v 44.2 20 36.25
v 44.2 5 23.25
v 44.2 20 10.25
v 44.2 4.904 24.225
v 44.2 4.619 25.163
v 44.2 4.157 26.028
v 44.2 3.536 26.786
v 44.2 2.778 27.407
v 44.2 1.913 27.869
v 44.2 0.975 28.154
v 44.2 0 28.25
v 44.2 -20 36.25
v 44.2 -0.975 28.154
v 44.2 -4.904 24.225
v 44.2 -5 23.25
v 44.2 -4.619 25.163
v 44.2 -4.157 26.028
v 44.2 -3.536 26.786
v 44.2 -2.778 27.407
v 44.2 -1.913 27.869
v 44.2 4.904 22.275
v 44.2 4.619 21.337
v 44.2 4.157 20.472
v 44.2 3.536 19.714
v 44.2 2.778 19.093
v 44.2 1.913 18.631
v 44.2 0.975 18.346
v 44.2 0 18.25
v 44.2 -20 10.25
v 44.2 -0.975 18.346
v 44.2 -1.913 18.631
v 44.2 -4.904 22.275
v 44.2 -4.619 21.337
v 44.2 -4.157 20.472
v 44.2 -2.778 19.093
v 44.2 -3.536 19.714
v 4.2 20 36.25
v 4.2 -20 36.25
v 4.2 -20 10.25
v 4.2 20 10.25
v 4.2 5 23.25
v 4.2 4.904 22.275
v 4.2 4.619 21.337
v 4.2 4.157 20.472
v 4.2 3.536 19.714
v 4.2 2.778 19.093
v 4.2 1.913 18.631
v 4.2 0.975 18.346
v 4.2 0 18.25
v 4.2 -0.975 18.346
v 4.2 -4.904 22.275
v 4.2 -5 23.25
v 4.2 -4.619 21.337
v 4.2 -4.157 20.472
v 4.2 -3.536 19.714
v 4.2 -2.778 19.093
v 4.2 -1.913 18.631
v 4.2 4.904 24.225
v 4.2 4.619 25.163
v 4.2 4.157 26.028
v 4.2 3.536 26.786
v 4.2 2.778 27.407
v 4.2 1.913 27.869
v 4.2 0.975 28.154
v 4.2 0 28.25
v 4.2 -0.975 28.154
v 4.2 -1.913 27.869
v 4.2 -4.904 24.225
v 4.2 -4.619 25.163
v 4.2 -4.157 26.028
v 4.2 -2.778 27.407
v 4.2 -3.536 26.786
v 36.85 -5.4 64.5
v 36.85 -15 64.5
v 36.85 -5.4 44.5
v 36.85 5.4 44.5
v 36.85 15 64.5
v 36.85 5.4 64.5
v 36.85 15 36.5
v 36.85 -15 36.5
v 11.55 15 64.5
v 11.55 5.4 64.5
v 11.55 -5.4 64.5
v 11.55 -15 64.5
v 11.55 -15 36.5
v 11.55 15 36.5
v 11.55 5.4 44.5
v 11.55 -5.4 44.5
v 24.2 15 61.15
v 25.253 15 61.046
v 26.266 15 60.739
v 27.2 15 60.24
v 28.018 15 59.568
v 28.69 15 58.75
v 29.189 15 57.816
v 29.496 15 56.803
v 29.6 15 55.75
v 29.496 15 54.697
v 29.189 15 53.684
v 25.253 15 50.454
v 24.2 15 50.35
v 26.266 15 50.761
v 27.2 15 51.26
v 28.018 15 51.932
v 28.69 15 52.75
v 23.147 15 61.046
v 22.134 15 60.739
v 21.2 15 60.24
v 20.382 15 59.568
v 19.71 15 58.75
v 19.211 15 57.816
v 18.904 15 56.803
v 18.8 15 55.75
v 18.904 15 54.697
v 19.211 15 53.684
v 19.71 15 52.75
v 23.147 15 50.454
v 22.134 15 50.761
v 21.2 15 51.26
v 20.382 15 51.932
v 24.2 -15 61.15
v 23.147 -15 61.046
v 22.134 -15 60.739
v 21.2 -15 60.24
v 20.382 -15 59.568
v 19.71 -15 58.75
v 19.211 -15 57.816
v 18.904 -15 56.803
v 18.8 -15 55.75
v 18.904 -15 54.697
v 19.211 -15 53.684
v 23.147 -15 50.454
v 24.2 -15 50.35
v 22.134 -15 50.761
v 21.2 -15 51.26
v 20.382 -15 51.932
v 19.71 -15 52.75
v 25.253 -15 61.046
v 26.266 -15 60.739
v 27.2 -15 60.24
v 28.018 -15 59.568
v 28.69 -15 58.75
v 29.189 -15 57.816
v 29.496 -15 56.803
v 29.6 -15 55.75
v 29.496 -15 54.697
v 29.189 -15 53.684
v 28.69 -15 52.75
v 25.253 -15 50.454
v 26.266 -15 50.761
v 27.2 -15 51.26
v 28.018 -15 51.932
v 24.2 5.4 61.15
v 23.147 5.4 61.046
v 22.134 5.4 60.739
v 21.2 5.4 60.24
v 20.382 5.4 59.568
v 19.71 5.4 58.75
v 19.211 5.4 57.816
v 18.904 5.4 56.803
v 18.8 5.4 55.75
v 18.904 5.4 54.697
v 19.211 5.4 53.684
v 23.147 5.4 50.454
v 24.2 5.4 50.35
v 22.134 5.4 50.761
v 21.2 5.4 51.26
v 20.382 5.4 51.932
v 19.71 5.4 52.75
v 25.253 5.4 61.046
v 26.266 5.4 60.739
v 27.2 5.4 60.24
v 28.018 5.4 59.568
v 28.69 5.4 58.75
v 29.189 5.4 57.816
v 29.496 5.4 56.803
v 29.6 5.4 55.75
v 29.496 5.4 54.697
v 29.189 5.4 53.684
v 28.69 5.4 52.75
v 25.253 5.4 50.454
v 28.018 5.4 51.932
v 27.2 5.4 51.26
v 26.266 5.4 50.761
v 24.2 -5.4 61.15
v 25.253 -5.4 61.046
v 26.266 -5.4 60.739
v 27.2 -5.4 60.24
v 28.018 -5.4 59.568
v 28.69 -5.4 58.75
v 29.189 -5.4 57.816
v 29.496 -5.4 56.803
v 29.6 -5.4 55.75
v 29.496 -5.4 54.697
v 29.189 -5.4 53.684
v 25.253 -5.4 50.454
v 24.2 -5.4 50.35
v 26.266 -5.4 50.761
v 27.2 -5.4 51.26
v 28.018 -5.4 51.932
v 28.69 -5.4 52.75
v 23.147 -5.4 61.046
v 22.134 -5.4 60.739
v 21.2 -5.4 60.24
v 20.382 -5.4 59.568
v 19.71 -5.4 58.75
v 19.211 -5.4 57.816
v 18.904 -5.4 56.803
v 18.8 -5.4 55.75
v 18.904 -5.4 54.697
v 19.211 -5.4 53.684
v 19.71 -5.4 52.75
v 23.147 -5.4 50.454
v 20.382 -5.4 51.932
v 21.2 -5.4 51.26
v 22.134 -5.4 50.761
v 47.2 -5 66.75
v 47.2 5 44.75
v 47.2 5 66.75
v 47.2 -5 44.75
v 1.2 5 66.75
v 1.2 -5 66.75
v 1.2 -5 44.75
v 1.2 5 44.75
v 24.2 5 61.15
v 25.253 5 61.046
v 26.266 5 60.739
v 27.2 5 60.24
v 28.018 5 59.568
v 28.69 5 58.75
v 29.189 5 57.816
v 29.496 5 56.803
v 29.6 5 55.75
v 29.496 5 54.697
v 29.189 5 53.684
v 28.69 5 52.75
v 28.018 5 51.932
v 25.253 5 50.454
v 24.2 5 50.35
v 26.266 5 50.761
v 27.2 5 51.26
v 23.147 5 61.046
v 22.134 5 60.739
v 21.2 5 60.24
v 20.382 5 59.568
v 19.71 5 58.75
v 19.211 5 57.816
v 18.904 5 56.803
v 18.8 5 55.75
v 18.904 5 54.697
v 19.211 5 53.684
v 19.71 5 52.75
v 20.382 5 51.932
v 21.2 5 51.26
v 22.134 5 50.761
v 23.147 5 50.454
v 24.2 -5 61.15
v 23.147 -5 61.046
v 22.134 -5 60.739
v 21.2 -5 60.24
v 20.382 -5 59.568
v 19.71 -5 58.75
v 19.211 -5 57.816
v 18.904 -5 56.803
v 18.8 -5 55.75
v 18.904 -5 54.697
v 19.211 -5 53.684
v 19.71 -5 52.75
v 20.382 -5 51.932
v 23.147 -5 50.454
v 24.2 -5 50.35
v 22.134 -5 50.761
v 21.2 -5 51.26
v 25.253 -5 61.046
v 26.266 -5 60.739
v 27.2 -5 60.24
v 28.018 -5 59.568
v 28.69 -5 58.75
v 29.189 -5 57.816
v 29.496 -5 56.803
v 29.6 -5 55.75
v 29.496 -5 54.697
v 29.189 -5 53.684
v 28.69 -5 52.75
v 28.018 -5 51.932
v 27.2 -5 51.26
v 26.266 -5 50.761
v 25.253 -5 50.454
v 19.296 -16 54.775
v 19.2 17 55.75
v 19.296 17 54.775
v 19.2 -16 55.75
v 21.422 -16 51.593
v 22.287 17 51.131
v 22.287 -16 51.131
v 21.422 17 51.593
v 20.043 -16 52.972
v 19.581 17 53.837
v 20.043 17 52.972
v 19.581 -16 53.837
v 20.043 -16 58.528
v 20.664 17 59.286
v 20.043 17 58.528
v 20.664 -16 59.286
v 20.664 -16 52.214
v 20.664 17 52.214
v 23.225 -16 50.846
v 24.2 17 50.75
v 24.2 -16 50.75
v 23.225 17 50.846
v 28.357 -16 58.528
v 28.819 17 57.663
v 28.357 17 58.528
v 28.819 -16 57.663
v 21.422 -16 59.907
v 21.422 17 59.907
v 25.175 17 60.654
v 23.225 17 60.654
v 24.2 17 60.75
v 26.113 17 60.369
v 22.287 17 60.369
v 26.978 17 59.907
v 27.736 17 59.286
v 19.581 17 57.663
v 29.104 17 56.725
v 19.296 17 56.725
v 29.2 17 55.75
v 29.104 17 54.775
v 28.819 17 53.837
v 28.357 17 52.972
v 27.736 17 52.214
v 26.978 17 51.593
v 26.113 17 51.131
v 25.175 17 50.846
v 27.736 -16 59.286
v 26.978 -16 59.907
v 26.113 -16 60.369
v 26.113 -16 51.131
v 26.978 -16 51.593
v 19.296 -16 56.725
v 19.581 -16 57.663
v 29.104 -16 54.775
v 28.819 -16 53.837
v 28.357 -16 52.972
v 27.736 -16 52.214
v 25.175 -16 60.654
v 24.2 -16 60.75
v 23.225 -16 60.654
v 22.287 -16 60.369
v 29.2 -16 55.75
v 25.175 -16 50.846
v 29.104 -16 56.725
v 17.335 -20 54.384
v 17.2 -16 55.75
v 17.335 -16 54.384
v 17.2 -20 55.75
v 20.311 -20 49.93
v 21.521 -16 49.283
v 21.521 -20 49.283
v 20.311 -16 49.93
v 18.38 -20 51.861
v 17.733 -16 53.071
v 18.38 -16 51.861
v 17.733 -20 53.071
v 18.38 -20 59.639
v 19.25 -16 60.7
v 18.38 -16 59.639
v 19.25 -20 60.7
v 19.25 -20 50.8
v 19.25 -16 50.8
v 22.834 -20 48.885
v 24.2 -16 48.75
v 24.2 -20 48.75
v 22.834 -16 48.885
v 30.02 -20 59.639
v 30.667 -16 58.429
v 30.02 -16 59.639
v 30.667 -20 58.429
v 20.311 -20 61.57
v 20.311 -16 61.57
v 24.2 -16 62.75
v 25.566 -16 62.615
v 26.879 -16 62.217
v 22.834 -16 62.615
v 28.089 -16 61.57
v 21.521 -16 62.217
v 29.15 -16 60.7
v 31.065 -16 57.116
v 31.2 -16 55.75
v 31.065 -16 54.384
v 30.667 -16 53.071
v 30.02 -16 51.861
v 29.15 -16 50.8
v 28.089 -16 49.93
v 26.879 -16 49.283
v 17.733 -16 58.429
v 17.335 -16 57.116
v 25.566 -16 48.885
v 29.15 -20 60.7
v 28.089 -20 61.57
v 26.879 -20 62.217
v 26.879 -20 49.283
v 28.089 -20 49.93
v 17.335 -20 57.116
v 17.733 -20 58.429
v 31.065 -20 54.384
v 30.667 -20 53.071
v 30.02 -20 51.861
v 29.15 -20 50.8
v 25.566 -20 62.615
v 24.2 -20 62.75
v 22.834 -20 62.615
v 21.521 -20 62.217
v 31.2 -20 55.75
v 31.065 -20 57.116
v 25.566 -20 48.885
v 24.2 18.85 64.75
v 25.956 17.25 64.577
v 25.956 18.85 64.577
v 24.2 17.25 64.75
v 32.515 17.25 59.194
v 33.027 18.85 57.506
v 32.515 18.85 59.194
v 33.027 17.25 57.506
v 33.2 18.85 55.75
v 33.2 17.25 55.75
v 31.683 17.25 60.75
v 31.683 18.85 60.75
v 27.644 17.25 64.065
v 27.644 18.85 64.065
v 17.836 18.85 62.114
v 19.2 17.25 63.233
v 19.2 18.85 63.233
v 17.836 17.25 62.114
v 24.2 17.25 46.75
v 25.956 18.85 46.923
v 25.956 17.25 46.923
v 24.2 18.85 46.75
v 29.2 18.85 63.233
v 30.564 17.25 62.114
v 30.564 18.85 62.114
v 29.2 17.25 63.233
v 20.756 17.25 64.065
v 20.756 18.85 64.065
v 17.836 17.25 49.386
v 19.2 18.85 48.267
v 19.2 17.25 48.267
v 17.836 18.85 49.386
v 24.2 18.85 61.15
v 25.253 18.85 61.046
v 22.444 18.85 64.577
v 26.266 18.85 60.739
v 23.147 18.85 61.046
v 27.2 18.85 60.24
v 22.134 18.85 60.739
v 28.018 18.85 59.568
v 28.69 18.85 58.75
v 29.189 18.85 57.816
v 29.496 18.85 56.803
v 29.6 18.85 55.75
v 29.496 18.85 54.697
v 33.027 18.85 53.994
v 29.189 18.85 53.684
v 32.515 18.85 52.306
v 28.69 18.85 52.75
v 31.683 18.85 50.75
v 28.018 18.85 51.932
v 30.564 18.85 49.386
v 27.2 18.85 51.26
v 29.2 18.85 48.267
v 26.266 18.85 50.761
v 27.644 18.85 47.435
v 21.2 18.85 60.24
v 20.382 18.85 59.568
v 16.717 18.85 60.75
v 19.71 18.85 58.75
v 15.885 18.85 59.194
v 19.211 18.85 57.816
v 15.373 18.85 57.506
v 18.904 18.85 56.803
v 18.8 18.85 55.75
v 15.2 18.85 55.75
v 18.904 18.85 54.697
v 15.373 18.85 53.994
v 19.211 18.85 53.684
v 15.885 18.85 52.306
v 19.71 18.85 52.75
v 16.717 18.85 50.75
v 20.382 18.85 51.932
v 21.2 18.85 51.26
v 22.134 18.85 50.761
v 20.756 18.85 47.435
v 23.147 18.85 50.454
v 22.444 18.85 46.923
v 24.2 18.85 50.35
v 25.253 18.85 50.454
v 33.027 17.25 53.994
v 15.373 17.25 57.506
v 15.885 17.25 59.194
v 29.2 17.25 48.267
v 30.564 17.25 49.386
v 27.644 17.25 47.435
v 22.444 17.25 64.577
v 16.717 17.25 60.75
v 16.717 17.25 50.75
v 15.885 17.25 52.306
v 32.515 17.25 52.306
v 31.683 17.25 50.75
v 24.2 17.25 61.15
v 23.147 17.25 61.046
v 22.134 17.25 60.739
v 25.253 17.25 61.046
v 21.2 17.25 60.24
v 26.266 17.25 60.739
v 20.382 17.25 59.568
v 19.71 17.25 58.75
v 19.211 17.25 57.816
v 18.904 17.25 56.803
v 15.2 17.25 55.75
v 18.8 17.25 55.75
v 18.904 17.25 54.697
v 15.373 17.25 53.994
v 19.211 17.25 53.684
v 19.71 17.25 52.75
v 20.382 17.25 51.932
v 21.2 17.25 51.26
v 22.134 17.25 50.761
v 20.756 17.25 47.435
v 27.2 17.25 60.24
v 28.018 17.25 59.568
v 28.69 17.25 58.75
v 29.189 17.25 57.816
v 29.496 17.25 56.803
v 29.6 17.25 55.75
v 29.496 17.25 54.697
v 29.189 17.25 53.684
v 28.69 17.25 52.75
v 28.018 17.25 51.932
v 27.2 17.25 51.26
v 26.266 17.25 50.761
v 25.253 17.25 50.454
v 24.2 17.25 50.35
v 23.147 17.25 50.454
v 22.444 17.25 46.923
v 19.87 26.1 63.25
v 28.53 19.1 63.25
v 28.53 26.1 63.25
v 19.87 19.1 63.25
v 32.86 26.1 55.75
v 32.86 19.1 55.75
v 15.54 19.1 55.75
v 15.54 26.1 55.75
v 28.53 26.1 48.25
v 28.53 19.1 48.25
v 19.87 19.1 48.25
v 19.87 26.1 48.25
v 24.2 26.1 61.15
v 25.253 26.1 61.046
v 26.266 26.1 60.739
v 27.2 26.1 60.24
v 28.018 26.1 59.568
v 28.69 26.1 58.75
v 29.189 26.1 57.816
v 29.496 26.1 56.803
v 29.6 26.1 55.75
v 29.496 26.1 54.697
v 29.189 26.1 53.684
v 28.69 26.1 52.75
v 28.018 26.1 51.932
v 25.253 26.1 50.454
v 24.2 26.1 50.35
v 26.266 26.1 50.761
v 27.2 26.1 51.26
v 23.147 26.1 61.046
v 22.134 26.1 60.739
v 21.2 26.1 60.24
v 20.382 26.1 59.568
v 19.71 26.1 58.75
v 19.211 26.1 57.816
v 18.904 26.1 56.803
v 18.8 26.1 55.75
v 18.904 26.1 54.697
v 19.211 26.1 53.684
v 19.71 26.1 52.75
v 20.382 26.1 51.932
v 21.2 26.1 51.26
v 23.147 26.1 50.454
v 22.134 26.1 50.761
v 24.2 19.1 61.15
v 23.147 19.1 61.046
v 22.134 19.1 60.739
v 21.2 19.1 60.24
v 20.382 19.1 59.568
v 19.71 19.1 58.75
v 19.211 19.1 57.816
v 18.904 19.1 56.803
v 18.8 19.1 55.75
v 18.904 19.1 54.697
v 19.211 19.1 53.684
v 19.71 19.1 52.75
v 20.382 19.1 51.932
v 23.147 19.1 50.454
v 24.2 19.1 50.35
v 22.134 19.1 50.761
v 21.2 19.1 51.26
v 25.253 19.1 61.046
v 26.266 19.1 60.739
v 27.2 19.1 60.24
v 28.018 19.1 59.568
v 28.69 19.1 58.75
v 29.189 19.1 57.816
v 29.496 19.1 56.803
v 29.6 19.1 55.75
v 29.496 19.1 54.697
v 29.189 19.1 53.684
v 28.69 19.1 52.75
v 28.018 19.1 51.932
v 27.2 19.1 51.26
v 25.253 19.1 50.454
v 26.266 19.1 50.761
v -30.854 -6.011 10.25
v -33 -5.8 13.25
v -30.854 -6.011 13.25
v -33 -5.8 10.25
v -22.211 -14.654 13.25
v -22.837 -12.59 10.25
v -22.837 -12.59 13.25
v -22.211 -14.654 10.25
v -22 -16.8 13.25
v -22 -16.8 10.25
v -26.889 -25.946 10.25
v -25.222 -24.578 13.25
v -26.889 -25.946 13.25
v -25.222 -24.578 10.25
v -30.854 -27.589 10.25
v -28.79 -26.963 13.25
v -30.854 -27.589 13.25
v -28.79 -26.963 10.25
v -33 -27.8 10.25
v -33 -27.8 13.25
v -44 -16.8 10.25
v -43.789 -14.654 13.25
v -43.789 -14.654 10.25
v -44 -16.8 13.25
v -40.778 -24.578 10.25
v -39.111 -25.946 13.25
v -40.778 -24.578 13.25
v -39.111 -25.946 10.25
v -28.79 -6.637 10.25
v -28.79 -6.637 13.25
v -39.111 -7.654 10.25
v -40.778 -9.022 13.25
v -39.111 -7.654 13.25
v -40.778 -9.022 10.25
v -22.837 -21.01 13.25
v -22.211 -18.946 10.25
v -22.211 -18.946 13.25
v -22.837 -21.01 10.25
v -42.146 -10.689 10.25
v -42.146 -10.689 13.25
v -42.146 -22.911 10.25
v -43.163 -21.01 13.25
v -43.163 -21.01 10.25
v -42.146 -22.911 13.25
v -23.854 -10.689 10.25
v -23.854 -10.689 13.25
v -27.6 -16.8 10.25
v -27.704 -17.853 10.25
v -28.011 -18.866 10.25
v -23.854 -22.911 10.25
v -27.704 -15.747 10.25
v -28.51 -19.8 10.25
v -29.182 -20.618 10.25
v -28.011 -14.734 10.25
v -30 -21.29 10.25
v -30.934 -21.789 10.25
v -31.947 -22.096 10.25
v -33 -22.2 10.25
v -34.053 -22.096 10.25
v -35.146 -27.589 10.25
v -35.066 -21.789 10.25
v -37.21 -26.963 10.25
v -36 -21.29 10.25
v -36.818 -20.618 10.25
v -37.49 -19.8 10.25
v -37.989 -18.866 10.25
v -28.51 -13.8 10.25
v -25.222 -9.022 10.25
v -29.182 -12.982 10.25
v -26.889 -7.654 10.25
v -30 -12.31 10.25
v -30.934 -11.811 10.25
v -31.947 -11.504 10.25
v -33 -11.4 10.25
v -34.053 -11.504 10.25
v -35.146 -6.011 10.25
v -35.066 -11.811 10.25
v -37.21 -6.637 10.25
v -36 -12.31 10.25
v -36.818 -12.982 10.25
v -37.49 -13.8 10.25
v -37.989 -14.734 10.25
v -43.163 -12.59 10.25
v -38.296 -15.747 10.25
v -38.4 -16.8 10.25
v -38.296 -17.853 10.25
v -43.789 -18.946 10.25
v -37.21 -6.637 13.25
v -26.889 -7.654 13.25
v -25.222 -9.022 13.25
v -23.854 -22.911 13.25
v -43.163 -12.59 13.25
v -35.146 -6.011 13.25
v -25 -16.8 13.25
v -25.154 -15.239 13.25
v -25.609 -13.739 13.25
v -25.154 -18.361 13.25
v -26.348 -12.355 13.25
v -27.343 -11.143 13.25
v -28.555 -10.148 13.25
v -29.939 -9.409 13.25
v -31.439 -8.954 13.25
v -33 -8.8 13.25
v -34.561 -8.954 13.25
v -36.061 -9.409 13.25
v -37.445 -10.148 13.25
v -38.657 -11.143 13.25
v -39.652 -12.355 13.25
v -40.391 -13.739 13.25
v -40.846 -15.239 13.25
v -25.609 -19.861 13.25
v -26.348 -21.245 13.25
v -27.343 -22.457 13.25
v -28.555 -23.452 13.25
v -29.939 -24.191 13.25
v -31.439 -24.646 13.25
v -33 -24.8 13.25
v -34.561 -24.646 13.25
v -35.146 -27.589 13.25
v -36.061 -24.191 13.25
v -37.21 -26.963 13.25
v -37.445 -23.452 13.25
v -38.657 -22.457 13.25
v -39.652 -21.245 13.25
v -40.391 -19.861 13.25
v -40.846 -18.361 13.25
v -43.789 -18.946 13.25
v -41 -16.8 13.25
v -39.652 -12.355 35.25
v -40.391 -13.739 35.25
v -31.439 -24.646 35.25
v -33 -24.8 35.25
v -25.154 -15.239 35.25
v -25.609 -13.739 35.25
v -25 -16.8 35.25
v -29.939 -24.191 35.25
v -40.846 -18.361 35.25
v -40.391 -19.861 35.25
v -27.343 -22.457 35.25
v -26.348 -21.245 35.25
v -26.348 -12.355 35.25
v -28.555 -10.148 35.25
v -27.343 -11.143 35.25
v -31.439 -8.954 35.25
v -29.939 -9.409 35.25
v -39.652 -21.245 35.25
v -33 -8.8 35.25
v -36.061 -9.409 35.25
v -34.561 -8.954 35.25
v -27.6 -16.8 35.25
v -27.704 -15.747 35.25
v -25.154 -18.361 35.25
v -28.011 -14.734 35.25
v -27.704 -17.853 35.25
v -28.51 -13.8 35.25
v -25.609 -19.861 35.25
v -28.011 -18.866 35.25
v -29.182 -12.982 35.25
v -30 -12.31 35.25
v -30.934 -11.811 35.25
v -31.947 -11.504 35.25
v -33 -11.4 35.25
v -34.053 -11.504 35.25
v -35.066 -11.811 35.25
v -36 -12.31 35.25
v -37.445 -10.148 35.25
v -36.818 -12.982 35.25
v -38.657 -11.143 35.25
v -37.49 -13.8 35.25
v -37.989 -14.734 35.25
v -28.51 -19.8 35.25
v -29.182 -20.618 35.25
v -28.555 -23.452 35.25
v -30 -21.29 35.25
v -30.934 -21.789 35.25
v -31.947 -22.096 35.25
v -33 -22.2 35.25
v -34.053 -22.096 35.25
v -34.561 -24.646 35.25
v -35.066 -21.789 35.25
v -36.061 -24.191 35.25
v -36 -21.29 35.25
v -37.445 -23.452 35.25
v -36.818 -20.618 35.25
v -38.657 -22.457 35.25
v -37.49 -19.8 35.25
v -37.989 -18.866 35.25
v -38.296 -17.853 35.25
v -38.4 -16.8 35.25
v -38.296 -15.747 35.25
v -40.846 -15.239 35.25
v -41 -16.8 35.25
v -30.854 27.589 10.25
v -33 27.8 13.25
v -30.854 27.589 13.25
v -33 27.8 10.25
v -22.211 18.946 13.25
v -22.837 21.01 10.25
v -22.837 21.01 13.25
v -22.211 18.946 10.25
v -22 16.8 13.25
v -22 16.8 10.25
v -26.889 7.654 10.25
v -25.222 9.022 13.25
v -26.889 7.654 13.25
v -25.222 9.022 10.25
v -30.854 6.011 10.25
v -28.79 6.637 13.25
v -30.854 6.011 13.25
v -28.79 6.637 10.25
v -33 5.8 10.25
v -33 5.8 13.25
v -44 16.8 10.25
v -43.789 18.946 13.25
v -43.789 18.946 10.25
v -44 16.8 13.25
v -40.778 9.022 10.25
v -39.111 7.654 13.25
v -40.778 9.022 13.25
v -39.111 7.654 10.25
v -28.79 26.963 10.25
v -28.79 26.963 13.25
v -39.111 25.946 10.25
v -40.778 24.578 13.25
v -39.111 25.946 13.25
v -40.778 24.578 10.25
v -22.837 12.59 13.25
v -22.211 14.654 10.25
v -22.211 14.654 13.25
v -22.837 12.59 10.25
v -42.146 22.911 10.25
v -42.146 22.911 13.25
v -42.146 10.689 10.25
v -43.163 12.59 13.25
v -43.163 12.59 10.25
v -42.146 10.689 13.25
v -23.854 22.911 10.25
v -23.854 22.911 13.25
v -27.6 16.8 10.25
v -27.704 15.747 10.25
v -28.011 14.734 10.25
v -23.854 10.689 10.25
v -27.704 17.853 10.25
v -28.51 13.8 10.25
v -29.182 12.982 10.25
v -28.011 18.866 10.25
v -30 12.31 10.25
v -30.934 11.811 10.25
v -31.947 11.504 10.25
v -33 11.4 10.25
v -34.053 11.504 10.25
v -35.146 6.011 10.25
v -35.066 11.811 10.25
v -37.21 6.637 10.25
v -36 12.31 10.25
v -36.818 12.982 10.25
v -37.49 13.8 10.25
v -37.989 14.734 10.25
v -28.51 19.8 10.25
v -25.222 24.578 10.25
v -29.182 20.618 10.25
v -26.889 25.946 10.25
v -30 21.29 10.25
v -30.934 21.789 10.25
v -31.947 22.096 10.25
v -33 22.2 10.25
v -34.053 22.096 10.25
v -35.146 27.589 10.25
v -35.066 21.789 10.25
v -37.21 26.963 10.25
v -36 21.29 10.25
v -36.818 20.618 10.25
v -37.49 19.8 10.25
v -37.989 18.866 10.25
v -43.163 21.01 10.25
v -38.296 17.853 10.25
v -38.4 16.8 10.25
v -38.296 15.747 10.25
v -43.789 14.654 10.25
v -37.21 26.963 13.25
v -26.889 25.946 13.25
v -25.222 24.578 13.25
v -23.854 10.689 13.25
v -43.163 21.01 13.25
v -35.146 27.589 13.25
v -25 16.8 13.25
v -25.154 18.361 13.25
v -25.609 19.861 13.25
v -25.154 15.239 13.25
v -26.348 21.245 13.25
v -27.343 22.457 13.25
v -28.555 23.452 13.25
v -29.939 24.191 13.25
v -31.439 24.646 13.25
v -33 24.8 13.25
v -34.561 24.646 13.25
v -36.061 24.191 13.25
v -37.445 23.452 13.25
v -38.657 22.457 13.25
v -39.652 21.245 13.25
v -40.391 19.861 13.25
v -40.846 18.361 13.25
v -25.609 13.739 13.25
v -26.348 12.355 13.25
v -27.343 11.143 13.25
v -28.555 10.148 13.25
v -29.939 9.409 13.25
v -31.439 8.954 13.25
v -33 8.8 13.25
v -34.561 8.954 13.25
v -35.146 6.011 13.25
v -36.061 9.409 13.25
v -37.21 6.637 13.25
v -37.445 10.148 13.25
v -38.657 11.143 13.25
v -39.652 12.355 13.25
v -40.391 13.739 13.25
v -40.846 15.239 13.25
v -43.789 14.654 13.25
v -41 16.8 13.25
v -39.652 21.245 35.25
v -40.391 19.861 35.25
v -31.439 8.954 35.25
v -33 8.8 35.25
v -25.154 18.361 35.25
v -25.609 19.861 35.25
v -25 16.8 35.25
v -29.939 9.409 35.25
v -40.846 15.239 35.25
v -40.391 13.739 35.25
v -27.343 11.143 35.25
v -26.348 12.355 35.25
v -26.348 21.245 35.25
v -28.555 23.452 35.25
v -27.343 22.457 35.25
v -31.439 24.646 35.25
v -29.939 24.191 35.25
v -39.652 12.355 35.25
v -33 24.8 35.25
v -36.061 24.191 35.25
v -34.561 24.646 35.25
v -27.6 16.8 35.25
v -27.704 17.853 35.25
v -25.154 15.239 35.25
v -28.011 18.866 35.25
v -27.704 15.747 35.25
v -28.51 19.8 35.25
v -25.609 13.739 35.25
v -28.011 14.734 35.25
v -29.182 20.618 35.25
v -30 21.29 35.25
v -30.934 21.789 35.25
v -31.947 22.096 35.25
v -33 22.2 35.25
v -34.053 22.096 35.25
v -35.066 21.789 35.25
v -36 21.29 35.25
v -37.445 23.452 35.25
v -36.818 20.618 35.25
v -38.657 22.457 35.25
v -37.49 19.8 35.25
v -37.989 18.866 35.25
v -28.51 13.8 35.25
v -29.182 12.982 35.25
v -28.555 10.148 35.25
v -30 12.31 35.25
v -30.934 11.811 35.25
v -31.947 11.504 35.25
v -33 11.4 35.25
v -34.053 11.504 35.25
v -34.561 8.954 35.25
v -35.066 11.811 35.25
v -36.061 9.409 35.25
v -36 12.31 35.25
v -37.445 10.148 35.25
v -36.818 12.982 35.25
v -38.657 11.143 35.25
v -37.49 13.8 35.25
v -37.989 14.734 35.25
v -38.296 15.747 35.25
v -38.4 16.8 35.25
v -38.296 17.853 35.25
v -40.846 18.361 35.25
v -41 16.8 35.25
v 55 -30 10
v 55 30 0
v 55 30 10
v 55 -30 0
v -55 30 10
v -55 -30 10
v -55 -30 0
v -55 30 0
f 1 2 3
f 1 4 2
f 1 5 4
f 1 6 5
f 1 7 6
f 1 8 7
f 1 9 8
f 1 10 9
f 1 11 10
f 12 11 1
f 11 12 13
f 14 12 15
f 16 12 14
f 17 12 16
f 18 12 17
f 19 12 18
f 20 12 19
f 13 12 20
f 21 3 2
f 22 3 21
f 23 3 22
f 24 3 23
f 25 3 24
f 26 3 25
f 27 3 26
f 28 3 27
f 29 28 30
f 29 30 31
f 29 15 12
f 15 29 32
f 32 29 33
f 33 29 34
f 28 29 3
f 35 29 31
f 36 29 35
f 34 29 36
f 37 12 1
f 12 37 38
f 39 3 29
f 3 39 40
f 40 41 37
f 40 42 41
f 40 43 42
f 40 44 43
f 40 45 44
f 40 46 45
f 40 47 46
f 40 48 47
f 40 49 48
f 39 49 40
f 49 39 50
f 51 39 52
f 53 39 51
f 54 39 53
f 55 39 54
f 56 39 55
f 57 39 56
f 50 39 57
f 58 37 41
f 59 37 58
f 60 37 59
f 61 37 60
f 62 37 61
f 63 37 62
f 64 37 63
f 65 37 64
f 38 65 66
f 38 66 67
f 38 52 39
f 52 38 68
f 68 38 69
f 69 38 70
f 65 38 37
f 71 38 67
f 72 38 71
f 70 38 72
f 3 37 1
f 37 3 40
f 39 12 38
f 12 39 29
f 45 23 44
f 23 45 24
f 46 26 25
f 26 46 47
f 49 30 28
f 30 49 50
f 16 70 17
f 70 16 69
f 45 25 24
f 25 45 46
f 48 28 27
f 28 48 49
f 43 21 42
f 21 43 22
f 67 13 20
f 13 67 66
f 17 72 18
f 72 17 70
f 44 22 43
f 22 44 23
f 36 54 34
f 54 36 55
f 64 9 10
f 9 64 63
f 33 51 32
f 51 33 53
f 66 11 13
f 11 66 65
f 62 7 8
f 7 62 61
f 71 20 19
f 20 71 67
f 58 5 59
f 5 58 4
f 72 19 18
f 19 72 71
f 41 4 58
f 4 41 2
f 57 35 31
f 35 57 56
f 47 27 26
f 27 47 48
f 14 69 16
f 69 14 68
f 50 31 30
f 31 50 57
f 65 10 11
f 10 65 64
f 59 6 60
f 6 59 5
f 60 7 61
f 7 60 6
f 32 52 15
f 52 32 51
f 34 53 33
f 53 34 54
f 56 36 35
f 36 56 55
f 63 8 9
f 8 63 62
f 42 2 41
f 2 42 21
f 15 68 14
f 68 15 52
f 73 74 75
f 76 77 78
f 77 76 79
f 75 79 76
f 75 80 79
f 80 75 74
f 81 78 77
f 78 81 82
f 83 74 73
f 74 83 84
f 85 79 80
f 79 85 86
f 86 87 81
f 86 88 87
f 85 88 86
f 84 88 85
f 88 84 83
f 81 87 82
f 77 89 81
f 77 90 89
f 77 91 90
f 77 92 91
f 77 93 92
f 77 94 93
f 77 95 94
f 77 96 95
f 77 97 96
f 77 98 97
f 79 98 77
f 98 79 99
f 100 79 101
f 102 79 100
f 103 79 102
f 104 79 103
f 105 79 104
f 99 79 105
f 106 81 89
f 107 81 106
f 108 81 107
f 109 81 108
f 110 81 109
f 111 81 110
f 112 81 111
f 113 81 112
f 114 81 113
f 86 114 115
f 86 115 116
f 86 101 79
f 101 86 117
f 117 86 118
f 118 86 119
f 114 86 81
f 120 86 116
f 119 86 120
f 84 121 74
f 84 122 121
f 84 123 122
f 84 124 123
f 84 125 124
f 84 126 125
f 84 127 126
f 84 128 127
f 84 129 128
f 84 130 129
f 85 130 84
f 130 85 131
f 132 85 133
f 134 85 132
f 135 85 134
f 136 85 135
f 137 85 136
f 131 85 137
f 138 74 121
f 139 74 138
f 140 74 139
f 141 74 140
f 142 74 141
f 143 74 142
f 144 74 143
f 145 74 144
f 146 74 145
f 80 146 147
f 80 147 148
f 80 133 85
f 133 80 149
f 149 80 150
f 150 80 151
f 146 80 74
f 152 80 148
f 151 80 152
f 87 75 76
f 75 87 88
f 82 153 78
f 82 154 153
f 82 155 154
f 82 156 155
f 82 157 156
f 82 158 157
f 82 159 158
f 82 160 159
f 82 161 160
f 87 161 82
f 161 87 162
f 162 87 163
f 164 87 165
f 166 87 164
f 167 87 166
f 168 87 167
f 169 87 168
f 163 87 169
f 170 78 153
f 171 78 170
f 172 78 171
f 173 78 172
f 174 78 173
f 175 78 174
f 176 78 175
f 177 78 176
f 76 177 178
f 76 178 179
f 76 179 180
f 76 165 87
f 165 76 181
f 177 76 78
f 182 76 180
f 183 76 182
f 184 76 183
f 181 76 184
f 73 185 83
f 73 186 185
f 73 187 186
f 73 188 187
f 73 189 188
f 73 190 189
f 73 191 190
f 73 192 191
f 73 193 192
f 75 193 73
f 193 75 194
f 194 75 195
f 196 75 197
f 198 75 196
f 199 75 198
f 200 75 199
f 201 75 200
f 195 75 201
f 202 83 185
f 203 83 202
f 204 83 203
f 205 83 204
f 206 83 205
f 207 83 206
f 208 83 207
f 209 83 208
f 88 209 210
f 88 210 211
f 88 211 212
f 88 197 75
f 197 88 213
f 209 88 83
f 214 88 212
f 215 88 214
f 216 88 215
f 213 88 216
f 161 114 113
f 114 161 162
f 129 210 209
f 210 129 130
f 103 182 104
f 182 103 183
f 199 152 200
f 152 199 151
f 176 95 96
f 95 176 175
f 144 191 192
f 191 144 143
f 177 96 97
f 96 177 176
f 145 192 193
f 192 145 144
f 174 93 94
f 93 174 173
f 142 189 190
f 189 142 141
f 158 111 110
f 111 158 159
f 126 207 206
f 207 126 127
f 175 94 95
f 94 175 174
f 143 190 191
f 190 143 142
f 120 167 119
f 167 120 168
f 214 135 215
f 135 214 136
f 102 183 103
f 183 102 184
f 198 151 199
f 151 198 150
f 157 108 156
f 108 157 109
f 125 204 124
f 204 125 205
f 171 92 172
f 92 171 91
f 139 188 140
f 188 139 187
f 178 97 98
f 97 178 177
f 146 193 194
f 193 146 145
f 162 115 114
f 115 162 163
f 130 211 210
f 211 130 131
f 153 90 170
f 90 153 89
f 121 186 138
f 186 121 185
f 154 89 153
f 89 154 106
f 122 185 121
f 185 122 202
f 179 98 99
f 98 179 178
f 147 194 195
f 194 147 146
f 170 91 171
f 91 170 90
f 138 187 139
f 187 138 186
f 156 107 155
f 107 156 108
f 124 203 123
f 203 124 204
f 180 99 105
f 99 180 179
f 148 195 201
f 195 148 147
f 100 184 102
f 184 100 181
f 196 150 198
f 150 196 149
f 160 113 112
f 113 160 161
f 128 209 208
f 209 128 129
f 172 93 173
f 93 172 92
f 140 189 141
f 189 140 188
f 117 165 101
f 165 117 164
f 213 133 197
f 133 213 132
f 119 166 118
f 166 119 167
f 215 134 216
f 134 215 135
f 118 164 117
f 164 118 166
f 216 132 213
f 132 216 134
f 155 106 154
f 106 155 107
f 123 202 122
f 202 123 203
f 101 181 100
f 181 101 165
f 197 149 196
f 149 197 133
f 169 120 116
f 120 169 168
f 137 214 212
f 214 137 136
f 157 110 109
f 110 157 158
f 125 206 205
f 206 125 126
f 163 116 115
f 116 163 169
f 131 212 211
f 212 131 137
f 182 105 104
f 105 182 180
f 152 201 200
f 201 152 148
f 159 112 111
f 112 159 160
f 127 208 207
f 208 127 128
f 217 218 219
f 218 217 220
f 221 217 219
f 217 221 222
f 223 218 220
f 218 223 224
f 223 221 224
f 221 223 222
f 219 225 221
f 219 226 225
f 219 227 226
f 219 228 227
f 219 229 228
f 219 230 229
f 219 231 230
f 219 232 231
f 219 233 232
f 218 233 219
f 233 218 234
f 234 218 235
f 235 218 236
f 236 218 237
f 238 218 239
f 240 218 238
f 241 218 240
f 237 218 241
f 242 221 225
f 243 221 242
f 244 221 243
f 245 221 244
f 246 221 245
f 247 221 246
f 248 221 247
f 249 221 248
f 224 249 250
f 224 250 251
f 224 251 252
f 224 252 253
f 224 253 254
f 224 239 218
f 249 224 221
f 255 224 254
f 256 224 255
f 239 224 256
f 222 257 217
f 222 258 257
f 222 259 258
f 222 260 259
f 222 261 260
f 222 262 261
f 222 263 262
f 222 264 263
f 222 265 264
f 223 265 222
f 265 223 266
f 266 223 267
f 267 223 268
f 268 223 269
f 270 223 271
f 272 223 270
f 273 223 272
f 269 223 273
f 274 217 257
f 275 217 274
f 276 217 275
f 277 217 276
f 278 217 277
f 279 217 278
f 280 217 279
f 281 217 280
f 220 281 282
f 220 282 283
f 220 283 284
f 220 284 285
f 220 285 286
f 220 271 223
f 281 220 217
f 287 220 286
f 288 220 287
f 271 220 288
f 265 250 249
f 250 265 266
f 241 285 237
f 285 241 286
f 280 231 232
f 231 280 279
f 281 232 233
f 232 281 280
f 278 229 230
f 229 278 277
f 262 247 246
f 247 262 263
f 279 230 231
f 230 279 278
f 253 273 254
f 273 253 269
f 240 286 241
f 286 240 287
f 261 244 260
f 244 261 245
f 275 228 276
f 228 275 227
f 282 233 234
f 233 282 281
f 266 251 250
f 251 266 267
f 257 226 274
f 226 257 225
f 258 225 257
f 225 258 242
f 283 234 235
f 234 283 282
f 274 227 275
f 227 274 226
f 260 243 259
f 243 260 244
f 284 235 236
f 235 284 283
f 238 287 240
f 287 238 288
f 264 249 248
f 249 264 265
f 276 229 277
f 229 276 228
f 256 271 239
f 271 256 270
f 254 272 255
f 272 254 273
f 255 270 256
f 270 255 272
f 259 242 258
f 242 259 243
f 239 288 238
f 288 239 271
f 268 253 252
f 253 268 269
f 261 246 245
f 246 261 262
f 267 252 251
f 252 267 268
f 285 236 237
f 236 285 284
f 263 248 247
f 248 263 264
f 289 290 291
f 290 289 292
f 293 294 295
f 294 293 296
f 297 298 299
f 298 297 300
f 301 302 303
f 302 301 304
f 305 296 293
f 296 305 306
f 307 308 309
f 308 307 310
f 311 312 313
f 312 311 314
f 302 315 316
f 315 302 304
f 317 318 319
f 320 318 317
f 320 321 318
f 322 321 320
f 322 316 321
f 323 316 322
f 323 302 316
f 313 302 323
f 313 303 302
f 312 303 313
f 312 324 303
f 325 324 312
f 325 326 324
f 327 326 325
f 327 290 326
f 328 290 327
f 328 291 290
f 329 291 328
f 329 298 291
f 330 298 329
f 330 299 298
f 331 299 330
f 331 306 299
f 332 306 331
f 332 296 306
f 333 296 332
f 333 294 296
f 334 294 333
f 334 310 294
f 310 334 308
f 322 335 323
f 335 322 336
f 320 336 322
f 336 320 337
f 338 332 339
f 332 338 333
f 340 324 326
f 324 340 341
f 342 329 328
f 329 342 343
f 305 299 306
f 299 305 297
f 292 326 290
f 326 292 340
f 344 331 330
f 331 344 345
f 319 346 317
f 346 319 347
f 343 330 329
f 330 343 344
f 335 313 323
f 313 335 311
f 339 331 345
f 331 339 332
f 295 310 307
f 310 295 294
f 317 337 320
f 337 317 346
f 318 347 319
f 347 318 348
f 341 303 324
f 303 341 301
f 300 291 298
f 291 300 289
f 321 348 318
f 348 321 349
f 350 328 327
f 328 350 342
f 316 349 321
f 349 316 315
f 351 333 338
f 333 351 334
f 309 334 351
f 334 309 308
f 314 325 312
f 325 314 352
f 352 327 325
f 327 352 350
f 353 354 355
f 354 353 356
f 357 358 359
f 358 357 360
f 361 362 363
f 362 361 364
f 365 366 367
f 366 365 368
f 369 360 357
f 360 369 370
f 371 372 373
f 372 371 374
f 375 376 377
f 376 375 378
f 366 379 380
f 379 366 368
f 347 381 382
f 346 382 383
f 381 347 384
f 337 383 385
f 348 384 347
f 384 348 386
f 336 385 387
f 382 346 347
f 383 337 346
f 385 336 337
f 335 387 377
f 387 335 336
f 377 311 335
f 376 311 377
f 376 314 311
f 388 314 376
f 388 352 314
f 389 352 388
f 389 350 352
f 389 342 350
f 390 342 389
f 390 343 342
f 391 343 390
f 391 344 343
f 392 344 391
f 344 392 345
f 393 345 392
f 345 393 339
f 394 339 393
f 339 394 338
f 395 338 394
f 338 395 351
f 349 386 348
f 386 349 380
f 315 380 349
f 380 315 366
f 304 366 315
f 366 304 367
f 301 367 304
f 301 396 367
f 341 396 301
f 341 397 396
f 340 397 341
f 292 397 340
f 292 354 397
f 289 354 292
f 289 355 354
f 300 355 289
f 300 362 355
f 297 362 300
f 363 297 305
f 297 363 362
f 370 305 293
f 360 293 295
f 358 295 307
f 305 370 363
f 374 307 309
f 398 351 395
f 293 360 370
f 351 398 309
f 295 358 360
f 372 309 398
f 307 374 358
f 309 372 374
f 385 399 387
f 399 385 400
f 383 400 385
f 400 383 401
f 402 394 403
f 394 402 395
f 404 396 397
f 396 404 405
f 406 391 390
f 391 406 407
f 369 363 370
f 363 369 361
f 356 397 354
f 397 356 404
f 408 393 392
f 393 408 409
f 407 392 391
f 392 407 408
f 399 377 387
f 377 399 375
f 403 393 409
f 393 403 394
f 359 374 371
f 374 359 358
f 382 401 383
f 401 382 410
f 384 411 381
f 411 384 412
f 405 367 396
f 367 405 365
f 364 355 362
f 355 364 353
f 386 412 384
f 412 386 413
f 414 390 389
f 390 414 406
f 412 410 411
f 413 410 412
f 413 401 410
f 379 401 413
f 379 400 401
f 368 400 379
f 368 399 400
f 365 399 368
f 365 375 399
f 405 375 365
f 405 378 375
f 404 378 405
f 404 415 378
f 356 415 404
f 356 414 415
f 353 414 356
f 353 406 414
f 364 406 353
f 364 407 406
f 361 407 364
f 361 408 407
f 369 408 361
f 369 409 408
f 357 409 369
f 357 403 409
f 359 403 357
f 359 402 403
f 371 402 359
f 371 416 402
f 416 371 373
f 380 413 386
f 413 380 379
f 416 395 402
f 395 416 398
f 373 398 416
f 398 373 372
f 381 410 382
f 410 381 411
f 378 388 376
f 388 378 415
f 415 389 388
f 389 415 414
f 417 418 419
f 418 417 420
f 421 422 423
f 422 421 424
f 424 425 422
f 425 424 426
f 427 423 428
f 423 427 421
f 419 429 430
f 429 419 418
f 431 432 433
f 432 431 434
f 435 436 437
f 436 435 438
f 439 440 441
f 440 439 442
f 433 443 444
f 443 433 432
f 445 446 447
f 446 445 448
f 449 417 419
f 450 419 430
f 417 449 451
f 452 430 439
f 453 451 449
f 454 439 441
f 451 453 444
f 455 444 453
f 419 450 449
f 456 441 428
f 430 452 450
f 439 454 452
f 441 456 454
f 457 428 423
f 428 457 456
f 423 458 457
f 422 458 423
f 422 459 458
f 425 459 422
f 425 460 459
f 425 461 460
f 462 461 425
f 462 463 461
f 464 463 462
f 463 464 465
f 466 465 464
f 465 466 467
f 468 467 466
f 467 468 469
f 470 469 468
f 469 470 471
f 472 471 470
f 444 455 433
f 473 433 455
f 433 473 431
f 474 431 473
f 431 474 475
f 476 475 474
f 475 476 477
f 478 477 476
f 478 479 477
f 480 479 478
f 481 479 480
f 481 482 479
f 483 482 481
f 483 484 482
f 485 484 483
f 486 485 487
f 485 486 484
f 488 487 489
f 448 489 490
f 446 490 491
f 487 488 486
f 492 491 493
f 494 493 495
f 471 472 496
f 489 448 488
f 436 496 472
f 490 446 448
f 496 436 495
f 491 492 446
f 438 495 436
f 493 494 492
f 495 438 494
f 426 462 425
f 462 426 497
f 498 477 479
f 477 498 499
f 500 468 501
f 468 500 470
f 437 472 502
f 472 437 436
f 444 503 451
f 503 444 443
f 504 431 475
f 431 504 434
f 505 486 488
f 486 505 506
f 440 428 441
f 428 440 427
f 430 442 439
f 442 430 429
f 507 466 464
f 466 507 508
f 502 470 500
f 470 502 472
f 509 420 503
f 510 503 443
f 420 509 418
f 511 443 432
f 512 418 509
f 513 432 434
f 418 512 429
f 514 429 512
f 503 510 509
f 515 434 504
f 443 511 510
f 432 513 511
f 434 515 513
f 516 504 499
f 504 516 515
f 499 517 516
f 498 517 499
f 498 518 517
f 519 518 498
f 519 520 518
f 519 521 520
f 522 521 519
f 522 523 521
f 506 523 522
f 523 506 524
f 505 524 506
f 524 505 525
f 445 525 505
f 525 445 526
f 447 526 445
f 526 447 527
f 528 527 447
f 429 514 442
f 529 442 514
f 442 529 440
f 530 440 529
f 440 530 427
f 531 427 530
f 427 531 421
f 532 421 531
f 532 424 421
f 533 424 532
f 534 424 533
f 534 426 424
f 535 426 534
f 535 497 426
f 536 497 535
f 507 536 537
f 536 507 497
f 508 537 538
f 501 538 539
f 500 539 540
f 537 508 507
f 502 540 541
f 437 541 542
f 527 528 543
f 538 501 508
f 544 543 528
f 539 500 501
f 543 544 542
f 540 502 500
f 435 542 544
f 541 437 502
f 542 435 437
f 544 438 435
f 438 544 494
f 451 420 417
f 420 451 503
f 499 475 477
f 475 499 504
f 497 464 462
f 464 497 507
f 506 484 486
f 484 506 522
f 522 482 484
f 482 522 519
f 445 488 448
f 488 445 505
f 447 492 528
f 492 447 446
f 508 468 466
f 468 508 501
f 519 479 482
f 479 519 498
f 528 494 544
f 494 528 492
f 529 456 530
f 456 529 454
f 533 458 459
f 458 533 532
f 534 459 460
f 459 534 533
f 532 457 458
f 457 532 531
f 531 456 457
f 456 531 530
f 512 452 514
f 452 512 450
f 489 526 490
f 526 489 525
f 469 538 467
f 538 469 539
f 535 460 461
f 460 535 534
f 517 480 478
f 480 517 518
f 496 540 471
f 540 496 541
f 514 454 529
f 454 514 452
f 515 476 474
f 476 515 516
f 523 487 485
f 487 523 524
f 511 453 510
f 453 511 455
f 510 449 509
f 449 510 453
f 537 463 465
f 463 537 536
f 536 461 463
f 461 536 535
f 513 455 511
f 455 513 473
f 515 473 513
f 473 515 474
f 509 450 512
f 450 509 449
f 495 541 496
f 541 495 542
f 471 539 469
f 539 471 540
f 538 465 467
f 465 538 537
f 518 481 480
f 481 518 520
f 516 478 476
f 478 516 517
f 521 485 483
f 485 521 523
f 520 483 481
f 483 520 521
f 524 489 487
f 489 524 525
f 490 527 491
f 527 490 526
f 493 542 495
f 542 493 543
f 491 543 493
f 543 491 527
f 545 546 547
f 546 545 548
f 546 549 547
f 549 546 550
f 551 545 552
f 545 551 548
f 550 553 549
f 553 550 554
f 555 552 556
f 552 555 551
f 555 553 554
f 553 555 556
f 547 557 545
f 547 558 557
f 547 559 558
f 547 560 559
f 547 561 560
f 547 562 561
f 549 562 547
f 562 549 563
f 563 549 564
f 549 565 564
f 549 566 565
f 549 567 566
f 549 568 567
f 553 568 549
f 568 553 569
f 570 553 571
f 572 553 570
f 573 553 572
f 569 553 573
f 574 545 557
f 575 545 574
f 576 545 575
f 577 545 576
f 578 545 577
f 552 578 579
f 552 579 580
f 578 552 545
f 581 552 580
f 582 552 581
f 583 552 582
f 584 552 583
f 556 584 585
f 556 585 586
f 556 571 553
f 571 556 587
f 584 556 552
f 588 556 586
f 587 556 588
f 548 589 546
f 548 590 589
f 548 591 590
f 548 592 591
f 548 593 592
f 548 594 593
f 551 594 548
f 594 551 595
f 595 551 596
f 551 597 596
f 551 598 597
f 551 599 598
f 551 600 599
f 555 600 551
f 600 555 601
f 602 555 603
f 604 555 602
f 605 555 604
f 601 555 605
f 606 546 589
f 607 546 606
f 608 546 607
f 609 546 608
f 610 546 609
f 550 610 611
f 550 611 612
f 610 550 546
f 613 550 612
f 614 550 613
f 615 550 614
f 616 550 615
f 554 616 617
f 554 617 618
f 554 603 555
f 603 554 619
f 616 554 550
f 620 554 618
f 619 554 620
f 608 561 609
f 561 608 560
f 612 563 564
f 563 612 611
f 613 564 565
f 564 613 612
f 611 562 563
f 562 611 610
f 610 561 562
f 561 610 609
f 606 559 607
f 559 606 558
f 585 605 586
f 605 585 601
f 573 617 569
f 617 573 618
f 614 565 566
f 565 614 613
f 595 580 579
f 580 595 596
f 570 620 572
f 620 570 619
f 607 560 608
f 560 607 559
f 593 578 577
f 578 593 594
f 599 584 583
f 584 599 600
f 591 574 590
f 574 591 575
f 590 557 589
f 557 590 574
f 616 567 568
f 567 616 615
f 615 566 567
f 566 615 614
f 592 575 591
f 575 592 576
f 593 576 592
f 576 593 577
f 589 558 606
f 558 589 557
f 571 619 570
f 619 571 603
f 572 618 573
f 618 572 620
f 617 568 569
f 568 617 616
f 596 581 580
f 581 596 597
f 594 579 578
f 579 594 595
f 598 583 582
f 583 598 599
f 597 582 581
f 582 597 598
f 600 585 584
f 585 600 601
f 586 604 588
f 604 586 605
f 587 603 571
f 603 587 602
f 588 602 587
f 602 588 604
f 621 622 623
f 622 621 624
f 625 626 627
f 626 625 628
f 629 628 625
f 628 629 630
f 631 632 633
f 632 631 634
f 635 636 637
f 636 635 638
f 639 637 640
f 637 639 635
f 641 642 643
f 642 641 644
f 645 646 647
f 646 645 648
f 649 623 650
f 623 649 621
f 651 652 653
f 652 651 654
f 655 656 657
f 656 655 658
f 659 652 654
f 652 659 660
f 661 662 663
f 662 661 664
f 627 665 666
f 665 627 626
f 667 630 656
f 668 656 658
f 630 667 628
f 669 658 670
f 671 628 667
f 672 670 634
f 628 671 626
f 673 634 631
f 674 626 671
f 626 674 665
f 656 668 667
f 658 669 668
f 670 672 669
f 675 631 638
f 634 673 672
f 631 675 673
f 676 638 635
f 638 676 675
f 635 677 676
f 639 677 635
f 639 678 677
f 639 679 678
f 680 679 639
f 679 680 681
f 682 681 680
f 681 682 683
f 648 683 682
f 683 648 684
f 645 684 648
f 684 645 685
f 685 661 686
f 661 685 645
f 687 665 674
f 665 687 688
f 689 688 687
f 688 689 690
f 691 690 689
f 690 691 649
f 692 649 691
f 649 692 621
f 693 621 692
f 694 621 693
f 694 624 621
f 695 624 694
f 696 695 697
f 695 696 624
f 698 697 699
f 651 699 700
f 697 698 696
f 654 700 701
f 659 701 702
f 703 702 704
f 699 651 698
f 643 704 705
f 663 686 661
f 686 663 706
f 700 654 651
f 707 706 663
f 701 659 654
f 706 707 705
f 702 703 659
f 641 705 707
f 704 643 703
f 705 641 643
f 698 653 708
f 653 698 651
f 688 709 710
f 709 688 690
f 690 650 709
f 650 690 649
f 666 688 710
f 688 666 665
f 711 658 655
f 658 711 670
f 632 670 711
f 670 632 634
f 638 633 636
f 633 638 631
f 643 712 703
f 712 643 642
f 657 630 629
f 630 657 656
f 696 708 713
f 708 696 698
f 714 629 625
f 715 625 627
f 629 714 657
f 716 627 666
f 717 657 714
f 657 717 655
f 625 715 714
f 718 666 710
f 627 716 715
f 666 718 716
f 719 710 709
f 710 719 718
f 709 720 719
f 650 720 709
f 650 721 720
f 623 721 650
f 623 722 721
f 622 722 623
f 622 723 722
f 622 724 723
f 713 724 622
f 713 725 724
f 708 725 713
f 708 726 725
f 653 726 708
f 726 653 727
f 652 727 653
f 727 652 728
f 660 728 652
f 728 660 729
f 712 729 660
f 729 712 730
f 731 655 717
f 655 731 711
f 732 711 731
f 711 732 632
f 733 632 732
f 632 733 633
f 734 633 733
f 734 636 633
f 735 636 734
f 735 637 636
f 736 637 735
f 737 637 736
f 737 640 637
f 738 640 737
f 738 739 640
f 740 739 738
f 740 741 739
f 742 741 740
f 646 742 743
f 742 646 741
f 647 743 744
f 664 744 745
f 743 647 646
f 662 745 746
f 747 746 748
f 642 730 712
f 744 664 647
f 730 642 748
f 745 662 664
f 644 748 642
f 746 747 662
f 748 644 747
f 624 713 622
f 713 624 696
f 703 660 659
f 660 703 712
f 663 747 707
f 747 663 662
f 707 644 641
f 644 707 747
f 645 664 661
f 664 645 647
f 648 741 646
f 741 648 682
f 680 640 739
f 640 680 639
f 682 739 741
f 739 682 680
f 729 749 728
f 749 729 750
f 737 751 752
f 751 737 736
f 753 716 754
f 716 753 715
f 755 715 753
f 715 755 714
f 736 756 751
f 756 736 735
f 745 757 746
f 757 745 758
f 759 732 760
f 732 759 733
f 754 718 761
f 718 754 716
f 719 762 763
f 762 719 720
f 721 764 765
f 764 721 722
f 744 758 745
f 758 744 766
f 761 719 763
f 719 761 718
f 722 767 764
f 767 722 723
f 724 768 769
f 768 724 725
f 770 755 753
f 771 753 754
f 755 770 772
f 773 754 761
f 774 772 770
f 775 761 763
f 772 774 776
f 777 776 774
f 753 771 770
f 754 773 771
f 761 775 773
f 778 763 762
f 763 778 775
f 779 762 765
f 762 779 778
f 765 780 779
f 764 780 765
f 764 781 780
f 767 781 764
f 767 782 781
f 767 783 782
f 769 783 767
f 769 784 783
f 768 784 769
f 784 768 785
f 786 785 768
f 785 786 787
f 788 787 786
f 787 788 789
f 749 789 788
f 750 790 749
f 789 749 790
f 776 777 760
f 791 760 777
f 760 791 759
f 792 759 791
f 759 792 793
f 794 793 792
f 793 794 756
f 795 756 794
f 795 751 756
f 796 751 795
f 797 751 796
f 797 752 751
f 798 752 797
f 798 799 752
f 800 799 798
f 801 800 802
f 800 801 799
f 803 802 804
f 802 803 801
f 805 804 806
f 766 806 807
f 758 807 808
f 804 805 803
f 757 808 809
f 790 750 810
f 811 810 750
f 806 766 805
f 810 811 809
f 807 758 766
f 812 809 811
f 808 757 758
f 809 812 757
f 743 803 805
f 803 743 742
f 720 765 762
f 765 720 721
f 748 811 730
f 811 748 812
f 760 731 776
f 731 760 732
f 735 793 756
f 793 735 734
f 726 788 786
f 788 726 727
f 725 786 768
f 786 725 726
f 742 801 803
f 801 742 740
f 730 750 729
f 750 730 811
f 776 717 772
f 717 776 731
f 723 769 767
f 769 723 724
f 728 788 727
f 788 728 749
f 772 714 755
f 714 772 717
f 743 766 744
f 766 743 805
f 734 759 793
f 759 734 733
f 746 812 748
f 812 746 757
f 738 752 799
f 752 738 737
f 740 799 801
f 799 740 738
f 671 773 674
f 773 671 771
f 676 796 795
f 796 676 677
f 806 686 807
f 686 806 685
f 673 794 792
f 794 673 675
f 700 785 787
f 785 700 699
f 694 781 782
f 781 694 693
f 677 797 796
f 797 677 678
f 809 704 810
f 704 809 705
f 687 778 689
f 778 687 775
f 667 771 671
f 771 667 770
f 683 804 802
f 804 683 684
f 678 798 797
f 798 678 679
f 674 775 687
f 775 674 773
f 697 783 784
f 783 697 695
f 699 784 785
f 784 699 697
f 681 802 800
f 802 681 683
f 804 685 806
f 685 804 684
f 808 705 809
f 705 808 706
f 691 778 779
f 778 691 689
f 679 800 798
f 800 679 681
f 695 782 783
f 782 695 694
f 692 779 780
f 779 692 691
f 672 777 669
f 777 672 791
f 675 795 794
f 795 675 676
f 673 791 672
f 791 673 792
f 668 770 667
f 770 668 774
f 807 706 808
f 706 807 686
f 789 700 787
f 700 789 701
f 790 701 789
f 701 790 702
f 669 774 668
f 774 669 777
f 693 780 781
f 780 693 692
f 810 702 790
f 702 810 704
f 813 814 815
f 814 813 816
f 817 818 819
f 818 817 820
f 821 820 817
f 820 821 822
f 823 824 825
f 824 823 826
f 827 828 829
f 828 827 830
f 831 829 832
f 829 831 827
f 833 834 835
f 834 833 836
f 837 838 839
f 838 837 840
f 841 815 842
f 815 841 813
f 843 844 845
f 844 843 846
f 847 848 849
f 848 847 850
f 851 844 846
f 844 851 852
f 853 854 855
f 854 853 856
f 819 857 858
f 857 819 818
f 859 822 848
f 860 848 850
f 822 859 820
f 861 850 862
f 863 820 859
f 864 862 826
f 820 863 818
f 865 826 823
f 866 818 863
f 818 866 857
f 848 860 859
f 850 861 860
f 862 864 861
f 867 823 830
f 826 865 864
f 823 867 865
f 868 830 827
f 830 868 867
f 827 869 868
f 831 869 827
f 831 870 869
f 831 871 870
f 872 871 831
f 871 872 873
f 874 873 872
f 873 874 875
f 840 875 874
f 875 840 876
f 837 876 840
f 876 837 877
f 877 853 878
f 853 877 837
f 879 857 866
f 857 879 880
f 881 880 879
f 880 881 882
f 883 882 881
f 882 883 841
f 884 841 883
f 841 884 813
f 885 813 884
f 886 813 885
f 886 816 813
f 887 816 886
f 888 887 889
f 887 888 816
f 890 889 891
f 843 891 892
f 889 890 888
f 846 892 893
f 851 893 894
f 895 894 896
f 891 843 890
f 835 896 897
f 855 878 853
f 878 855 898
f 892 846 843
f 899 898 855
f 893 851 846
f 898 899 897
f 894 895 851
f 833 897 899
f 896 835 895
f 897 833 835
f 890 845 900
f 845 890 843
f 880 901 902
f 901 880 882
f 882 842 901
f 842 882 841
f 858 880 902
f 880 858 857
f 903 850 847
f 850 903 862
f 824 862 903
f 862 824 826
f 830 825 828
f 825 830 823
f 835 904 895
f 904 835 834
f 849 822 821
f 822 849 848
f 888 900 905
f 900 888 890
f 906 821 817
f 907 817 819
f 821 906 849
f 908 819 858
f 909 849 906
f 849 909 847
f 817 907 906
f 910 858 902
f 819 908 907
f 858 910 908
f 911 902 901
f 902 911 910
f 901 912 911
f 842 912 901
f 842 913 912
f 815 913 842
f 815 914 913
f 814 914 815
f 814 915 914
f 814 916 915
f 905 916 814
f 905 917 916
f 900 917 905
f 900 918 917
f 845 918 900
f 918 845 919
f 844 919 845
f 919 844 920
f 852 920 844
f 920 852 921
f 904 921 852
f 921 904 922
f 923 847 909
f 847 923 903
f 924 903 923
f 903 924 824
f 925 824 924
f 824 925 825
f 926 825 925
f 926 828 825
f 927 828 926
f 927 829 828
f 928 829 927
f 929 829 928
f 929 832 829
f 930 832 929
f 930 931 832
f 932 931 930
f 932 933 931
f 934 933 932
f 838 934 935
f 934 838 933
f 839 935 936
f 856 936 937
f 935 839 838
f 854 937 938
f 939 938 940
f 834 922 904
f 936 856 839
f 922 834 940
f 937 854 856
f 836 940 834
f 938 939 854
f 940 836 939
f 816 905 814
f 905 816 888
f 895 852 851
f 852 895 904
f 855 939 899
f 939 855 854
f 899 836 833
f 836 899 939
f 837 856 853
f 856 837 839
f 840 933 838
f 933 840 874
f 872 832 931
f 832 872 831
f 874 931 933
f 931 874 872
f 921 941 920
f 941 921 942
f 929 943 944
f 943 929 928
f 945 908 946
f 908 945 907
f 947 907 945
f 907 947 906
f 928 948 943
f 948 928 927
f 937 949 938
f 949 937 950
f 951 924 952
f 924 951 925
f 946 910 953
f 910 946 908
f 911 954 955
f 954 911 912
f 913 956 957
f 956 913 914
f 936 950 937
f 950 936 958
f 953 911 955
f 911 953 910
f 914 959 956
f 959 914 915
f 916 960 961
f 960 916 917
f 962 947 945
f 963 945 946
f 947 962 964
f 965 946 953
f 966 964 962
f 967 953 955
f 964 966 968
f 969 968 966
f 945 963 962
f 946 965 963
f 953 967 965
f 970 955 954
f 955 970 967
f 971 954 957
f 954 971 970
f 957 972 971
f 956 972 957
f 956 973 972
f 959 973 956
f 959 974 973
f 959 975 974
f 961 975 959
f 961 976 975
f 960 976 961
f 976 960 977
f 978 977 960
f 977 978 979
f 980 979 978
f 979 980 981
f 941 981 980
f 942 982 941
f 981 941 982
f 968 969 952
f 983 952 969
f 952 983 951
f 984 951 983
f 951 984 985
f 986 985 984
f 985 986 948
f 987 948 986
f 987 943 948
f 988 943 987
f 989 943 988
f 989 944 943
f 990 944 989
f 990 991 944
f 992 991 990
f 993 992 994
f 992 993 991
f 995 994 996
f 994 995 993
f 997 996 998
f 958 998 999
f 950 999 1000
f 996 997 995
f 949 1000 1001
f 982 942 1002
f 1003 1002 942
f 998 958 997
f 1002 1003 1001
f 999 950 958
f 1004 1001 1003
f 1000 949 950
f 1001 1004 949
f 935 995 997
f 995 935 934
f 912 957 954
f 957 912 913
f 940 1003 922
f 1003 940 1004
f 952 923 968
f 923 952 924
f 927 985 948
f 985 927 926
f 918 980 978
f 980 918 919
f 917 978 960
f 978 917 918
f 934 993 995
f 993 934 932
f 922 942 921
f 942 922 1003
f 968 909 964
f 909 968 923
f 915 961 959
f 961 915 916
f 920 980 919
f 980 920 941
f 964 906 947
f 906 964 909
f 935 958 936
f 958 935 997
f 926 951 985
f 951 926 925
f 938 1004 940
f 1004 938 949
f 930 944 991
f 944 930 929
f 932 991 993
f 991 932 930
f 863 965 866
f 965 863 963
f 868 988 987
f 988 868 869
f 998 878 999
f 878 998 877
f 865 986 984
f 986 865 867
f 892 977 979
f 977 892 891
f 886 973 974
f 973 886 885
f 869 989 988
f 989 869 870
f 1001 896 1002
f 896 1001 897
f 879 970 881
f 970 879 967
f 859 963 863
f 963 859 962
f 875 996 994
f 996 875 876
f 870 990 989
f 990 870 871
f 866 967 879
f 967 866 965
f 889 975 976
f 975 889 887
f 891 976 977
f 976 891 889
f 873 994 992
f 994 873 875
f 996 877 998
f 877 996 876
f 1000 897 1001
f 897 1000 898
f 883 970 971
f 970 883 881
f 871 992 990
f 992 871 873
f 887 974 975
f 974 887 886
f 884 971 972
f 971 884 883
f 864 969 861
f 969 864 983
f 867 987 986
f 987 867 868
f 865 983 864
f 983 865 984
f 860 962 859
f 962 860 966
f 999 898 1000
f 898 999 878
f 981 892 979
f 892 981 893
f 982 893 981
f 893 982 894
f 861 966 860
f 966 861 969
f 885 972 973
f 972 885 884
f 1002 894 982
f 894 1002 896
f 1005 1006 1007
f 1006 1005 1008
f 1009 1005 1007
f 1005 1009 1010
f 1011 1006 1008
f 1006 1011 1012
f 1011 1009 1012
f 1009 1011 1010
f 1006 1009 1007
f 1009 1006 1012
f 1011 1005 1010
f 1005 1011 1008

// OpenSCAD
$fn = 32;

// ------------------------------------------------------------------------
// Indexing jig: plate 110 x 60 mm, pin d10
// Every part is its own module, assembly() places every instance.
// ------------------------------------------------------------------------

// --- part 1 ---
module jig_plate() {
  difference() {
    translate([-55, -30, 0]) cube([110, 60, 10]);
  }
}

// --- part 2 ---
module locator_block() {
  difference() {
    translate([-20, -20, 0]) cube([40, 40, 26]);
    translate([0, 0, 13]) rotate([0, 90, 0]) cylinder(h = 42, d = 10, center = true);
  }
}

// --- part 3 ---
module index_fork() {
  difference() {
    translate([-12.65, -15, 0]) cube([25.3, 30, 28]);
    translate([-13.65, -5.4, 8]) cube([27.3, 10.8, 21]);
    translate([0, 0, 19.25]) rotate([90, 0, 0]) cylinder(h = 32, d = 10.8, center = true);
  }
}

// --- part 4 ---
module index_arm() {
  difference() {
    translate([-23, -5, 0]) cube([46, 10, 22]);
    translate([0, 0, 11]) rotate([90, 0, 0]) cylinder(h = 12, d = 10.8, center = true);
  }
}

// --- part 5 ---
module index_pin() {
  rotate([0, 90, 0]) cylinder(h = 34, d = 10, center = true);
  translate([-20, 0, 0]) rotate([0, 90, 0]) cylinder(h = 4, d = 14);
}

// --- part 6 ---
module pin_washer() {
  difference() {
      translate([0, 0, 0]) cylinder(h = 1.6, d = 18);
      translate([0, 0, -1]) cylinder(h = 3.6, d = 10.8);
    }
}

// --- part 7 ---
module lock_nut() {
  difference() {
    linear_extrude(height = 7) polygon(points = [[8.66, 0], [4.33, 7.5], [-4.33, 7.5], [-8.66, 0], [-4.33, -7.5], [4.33, -7.5]]);
    translate([0, 0, -1]) cylinder(h = 9, d = 10.8);
  }
}

// --- part 8 ---
module guide_bush_a() {
  difference() {
    union() {
      cylinder(h = 3, d = 22);
      translate([0, 0, 3]) cylinder(h = 22, d = 16);
    }
    translate([0, 0, -1]) cylinder(h = 27, d = 10.8);
  }
}

// --- part 9 ---
module guide_bush_b() {
  difference() {
    union() {
      cylinder(h = 3, d = 22);
      translate([0, 0, 3]) cylinder(h = 22, d = 16);
    }
    translate([0, 0, -1]) cylinder(h = 27, d = 10.8);
  }
}

// --- assembly ---
module assembly() {
  color([0.80, 0.24, 0.20]) translate([0, 0, 0]) rotate([0, 0, 0]) jig_plate();
  color([0.20, 0.45, 0.75]) translate([24.2, 0, 10.25]) rotate([0, 0, 0]) locator_block();
  color([0.25, 0.62, 0.32]) translate([24.2, 0, 36.5]) rotate([0, 0, 0]) index_fork();
  color([0.92, 0.70, 0.18]) translate([24.2, 0, 44.75]) rotate([0, 0, 0]) index_arm();
  color([0.58, 0.35, 0.70]) translate([24.2, 0, 55.75]) rotate([0, 0, 90]) index_pin();
  color([0.16, 0.66, 0.66]) translate([24.2, 18.85, 55.75]) rotate([90, 0, 0]) pin_washer();
  color([0.85, 0.48, 0.18]) translate([24.2, 26.1, 55.75]) rotate([90, 0, 0]) lock_nut();
  color([0.55, 0.60, 0.65]) translate([-33, -16.8, 10.25]) rotate([0, 0, 0]) guide_bush_a();
  color([0.75, 0.30, 0.55]) translate([-33, 16.8, 10.25]) rotate([0, 0, 0]) guide_bush_b();
}

assembly();
